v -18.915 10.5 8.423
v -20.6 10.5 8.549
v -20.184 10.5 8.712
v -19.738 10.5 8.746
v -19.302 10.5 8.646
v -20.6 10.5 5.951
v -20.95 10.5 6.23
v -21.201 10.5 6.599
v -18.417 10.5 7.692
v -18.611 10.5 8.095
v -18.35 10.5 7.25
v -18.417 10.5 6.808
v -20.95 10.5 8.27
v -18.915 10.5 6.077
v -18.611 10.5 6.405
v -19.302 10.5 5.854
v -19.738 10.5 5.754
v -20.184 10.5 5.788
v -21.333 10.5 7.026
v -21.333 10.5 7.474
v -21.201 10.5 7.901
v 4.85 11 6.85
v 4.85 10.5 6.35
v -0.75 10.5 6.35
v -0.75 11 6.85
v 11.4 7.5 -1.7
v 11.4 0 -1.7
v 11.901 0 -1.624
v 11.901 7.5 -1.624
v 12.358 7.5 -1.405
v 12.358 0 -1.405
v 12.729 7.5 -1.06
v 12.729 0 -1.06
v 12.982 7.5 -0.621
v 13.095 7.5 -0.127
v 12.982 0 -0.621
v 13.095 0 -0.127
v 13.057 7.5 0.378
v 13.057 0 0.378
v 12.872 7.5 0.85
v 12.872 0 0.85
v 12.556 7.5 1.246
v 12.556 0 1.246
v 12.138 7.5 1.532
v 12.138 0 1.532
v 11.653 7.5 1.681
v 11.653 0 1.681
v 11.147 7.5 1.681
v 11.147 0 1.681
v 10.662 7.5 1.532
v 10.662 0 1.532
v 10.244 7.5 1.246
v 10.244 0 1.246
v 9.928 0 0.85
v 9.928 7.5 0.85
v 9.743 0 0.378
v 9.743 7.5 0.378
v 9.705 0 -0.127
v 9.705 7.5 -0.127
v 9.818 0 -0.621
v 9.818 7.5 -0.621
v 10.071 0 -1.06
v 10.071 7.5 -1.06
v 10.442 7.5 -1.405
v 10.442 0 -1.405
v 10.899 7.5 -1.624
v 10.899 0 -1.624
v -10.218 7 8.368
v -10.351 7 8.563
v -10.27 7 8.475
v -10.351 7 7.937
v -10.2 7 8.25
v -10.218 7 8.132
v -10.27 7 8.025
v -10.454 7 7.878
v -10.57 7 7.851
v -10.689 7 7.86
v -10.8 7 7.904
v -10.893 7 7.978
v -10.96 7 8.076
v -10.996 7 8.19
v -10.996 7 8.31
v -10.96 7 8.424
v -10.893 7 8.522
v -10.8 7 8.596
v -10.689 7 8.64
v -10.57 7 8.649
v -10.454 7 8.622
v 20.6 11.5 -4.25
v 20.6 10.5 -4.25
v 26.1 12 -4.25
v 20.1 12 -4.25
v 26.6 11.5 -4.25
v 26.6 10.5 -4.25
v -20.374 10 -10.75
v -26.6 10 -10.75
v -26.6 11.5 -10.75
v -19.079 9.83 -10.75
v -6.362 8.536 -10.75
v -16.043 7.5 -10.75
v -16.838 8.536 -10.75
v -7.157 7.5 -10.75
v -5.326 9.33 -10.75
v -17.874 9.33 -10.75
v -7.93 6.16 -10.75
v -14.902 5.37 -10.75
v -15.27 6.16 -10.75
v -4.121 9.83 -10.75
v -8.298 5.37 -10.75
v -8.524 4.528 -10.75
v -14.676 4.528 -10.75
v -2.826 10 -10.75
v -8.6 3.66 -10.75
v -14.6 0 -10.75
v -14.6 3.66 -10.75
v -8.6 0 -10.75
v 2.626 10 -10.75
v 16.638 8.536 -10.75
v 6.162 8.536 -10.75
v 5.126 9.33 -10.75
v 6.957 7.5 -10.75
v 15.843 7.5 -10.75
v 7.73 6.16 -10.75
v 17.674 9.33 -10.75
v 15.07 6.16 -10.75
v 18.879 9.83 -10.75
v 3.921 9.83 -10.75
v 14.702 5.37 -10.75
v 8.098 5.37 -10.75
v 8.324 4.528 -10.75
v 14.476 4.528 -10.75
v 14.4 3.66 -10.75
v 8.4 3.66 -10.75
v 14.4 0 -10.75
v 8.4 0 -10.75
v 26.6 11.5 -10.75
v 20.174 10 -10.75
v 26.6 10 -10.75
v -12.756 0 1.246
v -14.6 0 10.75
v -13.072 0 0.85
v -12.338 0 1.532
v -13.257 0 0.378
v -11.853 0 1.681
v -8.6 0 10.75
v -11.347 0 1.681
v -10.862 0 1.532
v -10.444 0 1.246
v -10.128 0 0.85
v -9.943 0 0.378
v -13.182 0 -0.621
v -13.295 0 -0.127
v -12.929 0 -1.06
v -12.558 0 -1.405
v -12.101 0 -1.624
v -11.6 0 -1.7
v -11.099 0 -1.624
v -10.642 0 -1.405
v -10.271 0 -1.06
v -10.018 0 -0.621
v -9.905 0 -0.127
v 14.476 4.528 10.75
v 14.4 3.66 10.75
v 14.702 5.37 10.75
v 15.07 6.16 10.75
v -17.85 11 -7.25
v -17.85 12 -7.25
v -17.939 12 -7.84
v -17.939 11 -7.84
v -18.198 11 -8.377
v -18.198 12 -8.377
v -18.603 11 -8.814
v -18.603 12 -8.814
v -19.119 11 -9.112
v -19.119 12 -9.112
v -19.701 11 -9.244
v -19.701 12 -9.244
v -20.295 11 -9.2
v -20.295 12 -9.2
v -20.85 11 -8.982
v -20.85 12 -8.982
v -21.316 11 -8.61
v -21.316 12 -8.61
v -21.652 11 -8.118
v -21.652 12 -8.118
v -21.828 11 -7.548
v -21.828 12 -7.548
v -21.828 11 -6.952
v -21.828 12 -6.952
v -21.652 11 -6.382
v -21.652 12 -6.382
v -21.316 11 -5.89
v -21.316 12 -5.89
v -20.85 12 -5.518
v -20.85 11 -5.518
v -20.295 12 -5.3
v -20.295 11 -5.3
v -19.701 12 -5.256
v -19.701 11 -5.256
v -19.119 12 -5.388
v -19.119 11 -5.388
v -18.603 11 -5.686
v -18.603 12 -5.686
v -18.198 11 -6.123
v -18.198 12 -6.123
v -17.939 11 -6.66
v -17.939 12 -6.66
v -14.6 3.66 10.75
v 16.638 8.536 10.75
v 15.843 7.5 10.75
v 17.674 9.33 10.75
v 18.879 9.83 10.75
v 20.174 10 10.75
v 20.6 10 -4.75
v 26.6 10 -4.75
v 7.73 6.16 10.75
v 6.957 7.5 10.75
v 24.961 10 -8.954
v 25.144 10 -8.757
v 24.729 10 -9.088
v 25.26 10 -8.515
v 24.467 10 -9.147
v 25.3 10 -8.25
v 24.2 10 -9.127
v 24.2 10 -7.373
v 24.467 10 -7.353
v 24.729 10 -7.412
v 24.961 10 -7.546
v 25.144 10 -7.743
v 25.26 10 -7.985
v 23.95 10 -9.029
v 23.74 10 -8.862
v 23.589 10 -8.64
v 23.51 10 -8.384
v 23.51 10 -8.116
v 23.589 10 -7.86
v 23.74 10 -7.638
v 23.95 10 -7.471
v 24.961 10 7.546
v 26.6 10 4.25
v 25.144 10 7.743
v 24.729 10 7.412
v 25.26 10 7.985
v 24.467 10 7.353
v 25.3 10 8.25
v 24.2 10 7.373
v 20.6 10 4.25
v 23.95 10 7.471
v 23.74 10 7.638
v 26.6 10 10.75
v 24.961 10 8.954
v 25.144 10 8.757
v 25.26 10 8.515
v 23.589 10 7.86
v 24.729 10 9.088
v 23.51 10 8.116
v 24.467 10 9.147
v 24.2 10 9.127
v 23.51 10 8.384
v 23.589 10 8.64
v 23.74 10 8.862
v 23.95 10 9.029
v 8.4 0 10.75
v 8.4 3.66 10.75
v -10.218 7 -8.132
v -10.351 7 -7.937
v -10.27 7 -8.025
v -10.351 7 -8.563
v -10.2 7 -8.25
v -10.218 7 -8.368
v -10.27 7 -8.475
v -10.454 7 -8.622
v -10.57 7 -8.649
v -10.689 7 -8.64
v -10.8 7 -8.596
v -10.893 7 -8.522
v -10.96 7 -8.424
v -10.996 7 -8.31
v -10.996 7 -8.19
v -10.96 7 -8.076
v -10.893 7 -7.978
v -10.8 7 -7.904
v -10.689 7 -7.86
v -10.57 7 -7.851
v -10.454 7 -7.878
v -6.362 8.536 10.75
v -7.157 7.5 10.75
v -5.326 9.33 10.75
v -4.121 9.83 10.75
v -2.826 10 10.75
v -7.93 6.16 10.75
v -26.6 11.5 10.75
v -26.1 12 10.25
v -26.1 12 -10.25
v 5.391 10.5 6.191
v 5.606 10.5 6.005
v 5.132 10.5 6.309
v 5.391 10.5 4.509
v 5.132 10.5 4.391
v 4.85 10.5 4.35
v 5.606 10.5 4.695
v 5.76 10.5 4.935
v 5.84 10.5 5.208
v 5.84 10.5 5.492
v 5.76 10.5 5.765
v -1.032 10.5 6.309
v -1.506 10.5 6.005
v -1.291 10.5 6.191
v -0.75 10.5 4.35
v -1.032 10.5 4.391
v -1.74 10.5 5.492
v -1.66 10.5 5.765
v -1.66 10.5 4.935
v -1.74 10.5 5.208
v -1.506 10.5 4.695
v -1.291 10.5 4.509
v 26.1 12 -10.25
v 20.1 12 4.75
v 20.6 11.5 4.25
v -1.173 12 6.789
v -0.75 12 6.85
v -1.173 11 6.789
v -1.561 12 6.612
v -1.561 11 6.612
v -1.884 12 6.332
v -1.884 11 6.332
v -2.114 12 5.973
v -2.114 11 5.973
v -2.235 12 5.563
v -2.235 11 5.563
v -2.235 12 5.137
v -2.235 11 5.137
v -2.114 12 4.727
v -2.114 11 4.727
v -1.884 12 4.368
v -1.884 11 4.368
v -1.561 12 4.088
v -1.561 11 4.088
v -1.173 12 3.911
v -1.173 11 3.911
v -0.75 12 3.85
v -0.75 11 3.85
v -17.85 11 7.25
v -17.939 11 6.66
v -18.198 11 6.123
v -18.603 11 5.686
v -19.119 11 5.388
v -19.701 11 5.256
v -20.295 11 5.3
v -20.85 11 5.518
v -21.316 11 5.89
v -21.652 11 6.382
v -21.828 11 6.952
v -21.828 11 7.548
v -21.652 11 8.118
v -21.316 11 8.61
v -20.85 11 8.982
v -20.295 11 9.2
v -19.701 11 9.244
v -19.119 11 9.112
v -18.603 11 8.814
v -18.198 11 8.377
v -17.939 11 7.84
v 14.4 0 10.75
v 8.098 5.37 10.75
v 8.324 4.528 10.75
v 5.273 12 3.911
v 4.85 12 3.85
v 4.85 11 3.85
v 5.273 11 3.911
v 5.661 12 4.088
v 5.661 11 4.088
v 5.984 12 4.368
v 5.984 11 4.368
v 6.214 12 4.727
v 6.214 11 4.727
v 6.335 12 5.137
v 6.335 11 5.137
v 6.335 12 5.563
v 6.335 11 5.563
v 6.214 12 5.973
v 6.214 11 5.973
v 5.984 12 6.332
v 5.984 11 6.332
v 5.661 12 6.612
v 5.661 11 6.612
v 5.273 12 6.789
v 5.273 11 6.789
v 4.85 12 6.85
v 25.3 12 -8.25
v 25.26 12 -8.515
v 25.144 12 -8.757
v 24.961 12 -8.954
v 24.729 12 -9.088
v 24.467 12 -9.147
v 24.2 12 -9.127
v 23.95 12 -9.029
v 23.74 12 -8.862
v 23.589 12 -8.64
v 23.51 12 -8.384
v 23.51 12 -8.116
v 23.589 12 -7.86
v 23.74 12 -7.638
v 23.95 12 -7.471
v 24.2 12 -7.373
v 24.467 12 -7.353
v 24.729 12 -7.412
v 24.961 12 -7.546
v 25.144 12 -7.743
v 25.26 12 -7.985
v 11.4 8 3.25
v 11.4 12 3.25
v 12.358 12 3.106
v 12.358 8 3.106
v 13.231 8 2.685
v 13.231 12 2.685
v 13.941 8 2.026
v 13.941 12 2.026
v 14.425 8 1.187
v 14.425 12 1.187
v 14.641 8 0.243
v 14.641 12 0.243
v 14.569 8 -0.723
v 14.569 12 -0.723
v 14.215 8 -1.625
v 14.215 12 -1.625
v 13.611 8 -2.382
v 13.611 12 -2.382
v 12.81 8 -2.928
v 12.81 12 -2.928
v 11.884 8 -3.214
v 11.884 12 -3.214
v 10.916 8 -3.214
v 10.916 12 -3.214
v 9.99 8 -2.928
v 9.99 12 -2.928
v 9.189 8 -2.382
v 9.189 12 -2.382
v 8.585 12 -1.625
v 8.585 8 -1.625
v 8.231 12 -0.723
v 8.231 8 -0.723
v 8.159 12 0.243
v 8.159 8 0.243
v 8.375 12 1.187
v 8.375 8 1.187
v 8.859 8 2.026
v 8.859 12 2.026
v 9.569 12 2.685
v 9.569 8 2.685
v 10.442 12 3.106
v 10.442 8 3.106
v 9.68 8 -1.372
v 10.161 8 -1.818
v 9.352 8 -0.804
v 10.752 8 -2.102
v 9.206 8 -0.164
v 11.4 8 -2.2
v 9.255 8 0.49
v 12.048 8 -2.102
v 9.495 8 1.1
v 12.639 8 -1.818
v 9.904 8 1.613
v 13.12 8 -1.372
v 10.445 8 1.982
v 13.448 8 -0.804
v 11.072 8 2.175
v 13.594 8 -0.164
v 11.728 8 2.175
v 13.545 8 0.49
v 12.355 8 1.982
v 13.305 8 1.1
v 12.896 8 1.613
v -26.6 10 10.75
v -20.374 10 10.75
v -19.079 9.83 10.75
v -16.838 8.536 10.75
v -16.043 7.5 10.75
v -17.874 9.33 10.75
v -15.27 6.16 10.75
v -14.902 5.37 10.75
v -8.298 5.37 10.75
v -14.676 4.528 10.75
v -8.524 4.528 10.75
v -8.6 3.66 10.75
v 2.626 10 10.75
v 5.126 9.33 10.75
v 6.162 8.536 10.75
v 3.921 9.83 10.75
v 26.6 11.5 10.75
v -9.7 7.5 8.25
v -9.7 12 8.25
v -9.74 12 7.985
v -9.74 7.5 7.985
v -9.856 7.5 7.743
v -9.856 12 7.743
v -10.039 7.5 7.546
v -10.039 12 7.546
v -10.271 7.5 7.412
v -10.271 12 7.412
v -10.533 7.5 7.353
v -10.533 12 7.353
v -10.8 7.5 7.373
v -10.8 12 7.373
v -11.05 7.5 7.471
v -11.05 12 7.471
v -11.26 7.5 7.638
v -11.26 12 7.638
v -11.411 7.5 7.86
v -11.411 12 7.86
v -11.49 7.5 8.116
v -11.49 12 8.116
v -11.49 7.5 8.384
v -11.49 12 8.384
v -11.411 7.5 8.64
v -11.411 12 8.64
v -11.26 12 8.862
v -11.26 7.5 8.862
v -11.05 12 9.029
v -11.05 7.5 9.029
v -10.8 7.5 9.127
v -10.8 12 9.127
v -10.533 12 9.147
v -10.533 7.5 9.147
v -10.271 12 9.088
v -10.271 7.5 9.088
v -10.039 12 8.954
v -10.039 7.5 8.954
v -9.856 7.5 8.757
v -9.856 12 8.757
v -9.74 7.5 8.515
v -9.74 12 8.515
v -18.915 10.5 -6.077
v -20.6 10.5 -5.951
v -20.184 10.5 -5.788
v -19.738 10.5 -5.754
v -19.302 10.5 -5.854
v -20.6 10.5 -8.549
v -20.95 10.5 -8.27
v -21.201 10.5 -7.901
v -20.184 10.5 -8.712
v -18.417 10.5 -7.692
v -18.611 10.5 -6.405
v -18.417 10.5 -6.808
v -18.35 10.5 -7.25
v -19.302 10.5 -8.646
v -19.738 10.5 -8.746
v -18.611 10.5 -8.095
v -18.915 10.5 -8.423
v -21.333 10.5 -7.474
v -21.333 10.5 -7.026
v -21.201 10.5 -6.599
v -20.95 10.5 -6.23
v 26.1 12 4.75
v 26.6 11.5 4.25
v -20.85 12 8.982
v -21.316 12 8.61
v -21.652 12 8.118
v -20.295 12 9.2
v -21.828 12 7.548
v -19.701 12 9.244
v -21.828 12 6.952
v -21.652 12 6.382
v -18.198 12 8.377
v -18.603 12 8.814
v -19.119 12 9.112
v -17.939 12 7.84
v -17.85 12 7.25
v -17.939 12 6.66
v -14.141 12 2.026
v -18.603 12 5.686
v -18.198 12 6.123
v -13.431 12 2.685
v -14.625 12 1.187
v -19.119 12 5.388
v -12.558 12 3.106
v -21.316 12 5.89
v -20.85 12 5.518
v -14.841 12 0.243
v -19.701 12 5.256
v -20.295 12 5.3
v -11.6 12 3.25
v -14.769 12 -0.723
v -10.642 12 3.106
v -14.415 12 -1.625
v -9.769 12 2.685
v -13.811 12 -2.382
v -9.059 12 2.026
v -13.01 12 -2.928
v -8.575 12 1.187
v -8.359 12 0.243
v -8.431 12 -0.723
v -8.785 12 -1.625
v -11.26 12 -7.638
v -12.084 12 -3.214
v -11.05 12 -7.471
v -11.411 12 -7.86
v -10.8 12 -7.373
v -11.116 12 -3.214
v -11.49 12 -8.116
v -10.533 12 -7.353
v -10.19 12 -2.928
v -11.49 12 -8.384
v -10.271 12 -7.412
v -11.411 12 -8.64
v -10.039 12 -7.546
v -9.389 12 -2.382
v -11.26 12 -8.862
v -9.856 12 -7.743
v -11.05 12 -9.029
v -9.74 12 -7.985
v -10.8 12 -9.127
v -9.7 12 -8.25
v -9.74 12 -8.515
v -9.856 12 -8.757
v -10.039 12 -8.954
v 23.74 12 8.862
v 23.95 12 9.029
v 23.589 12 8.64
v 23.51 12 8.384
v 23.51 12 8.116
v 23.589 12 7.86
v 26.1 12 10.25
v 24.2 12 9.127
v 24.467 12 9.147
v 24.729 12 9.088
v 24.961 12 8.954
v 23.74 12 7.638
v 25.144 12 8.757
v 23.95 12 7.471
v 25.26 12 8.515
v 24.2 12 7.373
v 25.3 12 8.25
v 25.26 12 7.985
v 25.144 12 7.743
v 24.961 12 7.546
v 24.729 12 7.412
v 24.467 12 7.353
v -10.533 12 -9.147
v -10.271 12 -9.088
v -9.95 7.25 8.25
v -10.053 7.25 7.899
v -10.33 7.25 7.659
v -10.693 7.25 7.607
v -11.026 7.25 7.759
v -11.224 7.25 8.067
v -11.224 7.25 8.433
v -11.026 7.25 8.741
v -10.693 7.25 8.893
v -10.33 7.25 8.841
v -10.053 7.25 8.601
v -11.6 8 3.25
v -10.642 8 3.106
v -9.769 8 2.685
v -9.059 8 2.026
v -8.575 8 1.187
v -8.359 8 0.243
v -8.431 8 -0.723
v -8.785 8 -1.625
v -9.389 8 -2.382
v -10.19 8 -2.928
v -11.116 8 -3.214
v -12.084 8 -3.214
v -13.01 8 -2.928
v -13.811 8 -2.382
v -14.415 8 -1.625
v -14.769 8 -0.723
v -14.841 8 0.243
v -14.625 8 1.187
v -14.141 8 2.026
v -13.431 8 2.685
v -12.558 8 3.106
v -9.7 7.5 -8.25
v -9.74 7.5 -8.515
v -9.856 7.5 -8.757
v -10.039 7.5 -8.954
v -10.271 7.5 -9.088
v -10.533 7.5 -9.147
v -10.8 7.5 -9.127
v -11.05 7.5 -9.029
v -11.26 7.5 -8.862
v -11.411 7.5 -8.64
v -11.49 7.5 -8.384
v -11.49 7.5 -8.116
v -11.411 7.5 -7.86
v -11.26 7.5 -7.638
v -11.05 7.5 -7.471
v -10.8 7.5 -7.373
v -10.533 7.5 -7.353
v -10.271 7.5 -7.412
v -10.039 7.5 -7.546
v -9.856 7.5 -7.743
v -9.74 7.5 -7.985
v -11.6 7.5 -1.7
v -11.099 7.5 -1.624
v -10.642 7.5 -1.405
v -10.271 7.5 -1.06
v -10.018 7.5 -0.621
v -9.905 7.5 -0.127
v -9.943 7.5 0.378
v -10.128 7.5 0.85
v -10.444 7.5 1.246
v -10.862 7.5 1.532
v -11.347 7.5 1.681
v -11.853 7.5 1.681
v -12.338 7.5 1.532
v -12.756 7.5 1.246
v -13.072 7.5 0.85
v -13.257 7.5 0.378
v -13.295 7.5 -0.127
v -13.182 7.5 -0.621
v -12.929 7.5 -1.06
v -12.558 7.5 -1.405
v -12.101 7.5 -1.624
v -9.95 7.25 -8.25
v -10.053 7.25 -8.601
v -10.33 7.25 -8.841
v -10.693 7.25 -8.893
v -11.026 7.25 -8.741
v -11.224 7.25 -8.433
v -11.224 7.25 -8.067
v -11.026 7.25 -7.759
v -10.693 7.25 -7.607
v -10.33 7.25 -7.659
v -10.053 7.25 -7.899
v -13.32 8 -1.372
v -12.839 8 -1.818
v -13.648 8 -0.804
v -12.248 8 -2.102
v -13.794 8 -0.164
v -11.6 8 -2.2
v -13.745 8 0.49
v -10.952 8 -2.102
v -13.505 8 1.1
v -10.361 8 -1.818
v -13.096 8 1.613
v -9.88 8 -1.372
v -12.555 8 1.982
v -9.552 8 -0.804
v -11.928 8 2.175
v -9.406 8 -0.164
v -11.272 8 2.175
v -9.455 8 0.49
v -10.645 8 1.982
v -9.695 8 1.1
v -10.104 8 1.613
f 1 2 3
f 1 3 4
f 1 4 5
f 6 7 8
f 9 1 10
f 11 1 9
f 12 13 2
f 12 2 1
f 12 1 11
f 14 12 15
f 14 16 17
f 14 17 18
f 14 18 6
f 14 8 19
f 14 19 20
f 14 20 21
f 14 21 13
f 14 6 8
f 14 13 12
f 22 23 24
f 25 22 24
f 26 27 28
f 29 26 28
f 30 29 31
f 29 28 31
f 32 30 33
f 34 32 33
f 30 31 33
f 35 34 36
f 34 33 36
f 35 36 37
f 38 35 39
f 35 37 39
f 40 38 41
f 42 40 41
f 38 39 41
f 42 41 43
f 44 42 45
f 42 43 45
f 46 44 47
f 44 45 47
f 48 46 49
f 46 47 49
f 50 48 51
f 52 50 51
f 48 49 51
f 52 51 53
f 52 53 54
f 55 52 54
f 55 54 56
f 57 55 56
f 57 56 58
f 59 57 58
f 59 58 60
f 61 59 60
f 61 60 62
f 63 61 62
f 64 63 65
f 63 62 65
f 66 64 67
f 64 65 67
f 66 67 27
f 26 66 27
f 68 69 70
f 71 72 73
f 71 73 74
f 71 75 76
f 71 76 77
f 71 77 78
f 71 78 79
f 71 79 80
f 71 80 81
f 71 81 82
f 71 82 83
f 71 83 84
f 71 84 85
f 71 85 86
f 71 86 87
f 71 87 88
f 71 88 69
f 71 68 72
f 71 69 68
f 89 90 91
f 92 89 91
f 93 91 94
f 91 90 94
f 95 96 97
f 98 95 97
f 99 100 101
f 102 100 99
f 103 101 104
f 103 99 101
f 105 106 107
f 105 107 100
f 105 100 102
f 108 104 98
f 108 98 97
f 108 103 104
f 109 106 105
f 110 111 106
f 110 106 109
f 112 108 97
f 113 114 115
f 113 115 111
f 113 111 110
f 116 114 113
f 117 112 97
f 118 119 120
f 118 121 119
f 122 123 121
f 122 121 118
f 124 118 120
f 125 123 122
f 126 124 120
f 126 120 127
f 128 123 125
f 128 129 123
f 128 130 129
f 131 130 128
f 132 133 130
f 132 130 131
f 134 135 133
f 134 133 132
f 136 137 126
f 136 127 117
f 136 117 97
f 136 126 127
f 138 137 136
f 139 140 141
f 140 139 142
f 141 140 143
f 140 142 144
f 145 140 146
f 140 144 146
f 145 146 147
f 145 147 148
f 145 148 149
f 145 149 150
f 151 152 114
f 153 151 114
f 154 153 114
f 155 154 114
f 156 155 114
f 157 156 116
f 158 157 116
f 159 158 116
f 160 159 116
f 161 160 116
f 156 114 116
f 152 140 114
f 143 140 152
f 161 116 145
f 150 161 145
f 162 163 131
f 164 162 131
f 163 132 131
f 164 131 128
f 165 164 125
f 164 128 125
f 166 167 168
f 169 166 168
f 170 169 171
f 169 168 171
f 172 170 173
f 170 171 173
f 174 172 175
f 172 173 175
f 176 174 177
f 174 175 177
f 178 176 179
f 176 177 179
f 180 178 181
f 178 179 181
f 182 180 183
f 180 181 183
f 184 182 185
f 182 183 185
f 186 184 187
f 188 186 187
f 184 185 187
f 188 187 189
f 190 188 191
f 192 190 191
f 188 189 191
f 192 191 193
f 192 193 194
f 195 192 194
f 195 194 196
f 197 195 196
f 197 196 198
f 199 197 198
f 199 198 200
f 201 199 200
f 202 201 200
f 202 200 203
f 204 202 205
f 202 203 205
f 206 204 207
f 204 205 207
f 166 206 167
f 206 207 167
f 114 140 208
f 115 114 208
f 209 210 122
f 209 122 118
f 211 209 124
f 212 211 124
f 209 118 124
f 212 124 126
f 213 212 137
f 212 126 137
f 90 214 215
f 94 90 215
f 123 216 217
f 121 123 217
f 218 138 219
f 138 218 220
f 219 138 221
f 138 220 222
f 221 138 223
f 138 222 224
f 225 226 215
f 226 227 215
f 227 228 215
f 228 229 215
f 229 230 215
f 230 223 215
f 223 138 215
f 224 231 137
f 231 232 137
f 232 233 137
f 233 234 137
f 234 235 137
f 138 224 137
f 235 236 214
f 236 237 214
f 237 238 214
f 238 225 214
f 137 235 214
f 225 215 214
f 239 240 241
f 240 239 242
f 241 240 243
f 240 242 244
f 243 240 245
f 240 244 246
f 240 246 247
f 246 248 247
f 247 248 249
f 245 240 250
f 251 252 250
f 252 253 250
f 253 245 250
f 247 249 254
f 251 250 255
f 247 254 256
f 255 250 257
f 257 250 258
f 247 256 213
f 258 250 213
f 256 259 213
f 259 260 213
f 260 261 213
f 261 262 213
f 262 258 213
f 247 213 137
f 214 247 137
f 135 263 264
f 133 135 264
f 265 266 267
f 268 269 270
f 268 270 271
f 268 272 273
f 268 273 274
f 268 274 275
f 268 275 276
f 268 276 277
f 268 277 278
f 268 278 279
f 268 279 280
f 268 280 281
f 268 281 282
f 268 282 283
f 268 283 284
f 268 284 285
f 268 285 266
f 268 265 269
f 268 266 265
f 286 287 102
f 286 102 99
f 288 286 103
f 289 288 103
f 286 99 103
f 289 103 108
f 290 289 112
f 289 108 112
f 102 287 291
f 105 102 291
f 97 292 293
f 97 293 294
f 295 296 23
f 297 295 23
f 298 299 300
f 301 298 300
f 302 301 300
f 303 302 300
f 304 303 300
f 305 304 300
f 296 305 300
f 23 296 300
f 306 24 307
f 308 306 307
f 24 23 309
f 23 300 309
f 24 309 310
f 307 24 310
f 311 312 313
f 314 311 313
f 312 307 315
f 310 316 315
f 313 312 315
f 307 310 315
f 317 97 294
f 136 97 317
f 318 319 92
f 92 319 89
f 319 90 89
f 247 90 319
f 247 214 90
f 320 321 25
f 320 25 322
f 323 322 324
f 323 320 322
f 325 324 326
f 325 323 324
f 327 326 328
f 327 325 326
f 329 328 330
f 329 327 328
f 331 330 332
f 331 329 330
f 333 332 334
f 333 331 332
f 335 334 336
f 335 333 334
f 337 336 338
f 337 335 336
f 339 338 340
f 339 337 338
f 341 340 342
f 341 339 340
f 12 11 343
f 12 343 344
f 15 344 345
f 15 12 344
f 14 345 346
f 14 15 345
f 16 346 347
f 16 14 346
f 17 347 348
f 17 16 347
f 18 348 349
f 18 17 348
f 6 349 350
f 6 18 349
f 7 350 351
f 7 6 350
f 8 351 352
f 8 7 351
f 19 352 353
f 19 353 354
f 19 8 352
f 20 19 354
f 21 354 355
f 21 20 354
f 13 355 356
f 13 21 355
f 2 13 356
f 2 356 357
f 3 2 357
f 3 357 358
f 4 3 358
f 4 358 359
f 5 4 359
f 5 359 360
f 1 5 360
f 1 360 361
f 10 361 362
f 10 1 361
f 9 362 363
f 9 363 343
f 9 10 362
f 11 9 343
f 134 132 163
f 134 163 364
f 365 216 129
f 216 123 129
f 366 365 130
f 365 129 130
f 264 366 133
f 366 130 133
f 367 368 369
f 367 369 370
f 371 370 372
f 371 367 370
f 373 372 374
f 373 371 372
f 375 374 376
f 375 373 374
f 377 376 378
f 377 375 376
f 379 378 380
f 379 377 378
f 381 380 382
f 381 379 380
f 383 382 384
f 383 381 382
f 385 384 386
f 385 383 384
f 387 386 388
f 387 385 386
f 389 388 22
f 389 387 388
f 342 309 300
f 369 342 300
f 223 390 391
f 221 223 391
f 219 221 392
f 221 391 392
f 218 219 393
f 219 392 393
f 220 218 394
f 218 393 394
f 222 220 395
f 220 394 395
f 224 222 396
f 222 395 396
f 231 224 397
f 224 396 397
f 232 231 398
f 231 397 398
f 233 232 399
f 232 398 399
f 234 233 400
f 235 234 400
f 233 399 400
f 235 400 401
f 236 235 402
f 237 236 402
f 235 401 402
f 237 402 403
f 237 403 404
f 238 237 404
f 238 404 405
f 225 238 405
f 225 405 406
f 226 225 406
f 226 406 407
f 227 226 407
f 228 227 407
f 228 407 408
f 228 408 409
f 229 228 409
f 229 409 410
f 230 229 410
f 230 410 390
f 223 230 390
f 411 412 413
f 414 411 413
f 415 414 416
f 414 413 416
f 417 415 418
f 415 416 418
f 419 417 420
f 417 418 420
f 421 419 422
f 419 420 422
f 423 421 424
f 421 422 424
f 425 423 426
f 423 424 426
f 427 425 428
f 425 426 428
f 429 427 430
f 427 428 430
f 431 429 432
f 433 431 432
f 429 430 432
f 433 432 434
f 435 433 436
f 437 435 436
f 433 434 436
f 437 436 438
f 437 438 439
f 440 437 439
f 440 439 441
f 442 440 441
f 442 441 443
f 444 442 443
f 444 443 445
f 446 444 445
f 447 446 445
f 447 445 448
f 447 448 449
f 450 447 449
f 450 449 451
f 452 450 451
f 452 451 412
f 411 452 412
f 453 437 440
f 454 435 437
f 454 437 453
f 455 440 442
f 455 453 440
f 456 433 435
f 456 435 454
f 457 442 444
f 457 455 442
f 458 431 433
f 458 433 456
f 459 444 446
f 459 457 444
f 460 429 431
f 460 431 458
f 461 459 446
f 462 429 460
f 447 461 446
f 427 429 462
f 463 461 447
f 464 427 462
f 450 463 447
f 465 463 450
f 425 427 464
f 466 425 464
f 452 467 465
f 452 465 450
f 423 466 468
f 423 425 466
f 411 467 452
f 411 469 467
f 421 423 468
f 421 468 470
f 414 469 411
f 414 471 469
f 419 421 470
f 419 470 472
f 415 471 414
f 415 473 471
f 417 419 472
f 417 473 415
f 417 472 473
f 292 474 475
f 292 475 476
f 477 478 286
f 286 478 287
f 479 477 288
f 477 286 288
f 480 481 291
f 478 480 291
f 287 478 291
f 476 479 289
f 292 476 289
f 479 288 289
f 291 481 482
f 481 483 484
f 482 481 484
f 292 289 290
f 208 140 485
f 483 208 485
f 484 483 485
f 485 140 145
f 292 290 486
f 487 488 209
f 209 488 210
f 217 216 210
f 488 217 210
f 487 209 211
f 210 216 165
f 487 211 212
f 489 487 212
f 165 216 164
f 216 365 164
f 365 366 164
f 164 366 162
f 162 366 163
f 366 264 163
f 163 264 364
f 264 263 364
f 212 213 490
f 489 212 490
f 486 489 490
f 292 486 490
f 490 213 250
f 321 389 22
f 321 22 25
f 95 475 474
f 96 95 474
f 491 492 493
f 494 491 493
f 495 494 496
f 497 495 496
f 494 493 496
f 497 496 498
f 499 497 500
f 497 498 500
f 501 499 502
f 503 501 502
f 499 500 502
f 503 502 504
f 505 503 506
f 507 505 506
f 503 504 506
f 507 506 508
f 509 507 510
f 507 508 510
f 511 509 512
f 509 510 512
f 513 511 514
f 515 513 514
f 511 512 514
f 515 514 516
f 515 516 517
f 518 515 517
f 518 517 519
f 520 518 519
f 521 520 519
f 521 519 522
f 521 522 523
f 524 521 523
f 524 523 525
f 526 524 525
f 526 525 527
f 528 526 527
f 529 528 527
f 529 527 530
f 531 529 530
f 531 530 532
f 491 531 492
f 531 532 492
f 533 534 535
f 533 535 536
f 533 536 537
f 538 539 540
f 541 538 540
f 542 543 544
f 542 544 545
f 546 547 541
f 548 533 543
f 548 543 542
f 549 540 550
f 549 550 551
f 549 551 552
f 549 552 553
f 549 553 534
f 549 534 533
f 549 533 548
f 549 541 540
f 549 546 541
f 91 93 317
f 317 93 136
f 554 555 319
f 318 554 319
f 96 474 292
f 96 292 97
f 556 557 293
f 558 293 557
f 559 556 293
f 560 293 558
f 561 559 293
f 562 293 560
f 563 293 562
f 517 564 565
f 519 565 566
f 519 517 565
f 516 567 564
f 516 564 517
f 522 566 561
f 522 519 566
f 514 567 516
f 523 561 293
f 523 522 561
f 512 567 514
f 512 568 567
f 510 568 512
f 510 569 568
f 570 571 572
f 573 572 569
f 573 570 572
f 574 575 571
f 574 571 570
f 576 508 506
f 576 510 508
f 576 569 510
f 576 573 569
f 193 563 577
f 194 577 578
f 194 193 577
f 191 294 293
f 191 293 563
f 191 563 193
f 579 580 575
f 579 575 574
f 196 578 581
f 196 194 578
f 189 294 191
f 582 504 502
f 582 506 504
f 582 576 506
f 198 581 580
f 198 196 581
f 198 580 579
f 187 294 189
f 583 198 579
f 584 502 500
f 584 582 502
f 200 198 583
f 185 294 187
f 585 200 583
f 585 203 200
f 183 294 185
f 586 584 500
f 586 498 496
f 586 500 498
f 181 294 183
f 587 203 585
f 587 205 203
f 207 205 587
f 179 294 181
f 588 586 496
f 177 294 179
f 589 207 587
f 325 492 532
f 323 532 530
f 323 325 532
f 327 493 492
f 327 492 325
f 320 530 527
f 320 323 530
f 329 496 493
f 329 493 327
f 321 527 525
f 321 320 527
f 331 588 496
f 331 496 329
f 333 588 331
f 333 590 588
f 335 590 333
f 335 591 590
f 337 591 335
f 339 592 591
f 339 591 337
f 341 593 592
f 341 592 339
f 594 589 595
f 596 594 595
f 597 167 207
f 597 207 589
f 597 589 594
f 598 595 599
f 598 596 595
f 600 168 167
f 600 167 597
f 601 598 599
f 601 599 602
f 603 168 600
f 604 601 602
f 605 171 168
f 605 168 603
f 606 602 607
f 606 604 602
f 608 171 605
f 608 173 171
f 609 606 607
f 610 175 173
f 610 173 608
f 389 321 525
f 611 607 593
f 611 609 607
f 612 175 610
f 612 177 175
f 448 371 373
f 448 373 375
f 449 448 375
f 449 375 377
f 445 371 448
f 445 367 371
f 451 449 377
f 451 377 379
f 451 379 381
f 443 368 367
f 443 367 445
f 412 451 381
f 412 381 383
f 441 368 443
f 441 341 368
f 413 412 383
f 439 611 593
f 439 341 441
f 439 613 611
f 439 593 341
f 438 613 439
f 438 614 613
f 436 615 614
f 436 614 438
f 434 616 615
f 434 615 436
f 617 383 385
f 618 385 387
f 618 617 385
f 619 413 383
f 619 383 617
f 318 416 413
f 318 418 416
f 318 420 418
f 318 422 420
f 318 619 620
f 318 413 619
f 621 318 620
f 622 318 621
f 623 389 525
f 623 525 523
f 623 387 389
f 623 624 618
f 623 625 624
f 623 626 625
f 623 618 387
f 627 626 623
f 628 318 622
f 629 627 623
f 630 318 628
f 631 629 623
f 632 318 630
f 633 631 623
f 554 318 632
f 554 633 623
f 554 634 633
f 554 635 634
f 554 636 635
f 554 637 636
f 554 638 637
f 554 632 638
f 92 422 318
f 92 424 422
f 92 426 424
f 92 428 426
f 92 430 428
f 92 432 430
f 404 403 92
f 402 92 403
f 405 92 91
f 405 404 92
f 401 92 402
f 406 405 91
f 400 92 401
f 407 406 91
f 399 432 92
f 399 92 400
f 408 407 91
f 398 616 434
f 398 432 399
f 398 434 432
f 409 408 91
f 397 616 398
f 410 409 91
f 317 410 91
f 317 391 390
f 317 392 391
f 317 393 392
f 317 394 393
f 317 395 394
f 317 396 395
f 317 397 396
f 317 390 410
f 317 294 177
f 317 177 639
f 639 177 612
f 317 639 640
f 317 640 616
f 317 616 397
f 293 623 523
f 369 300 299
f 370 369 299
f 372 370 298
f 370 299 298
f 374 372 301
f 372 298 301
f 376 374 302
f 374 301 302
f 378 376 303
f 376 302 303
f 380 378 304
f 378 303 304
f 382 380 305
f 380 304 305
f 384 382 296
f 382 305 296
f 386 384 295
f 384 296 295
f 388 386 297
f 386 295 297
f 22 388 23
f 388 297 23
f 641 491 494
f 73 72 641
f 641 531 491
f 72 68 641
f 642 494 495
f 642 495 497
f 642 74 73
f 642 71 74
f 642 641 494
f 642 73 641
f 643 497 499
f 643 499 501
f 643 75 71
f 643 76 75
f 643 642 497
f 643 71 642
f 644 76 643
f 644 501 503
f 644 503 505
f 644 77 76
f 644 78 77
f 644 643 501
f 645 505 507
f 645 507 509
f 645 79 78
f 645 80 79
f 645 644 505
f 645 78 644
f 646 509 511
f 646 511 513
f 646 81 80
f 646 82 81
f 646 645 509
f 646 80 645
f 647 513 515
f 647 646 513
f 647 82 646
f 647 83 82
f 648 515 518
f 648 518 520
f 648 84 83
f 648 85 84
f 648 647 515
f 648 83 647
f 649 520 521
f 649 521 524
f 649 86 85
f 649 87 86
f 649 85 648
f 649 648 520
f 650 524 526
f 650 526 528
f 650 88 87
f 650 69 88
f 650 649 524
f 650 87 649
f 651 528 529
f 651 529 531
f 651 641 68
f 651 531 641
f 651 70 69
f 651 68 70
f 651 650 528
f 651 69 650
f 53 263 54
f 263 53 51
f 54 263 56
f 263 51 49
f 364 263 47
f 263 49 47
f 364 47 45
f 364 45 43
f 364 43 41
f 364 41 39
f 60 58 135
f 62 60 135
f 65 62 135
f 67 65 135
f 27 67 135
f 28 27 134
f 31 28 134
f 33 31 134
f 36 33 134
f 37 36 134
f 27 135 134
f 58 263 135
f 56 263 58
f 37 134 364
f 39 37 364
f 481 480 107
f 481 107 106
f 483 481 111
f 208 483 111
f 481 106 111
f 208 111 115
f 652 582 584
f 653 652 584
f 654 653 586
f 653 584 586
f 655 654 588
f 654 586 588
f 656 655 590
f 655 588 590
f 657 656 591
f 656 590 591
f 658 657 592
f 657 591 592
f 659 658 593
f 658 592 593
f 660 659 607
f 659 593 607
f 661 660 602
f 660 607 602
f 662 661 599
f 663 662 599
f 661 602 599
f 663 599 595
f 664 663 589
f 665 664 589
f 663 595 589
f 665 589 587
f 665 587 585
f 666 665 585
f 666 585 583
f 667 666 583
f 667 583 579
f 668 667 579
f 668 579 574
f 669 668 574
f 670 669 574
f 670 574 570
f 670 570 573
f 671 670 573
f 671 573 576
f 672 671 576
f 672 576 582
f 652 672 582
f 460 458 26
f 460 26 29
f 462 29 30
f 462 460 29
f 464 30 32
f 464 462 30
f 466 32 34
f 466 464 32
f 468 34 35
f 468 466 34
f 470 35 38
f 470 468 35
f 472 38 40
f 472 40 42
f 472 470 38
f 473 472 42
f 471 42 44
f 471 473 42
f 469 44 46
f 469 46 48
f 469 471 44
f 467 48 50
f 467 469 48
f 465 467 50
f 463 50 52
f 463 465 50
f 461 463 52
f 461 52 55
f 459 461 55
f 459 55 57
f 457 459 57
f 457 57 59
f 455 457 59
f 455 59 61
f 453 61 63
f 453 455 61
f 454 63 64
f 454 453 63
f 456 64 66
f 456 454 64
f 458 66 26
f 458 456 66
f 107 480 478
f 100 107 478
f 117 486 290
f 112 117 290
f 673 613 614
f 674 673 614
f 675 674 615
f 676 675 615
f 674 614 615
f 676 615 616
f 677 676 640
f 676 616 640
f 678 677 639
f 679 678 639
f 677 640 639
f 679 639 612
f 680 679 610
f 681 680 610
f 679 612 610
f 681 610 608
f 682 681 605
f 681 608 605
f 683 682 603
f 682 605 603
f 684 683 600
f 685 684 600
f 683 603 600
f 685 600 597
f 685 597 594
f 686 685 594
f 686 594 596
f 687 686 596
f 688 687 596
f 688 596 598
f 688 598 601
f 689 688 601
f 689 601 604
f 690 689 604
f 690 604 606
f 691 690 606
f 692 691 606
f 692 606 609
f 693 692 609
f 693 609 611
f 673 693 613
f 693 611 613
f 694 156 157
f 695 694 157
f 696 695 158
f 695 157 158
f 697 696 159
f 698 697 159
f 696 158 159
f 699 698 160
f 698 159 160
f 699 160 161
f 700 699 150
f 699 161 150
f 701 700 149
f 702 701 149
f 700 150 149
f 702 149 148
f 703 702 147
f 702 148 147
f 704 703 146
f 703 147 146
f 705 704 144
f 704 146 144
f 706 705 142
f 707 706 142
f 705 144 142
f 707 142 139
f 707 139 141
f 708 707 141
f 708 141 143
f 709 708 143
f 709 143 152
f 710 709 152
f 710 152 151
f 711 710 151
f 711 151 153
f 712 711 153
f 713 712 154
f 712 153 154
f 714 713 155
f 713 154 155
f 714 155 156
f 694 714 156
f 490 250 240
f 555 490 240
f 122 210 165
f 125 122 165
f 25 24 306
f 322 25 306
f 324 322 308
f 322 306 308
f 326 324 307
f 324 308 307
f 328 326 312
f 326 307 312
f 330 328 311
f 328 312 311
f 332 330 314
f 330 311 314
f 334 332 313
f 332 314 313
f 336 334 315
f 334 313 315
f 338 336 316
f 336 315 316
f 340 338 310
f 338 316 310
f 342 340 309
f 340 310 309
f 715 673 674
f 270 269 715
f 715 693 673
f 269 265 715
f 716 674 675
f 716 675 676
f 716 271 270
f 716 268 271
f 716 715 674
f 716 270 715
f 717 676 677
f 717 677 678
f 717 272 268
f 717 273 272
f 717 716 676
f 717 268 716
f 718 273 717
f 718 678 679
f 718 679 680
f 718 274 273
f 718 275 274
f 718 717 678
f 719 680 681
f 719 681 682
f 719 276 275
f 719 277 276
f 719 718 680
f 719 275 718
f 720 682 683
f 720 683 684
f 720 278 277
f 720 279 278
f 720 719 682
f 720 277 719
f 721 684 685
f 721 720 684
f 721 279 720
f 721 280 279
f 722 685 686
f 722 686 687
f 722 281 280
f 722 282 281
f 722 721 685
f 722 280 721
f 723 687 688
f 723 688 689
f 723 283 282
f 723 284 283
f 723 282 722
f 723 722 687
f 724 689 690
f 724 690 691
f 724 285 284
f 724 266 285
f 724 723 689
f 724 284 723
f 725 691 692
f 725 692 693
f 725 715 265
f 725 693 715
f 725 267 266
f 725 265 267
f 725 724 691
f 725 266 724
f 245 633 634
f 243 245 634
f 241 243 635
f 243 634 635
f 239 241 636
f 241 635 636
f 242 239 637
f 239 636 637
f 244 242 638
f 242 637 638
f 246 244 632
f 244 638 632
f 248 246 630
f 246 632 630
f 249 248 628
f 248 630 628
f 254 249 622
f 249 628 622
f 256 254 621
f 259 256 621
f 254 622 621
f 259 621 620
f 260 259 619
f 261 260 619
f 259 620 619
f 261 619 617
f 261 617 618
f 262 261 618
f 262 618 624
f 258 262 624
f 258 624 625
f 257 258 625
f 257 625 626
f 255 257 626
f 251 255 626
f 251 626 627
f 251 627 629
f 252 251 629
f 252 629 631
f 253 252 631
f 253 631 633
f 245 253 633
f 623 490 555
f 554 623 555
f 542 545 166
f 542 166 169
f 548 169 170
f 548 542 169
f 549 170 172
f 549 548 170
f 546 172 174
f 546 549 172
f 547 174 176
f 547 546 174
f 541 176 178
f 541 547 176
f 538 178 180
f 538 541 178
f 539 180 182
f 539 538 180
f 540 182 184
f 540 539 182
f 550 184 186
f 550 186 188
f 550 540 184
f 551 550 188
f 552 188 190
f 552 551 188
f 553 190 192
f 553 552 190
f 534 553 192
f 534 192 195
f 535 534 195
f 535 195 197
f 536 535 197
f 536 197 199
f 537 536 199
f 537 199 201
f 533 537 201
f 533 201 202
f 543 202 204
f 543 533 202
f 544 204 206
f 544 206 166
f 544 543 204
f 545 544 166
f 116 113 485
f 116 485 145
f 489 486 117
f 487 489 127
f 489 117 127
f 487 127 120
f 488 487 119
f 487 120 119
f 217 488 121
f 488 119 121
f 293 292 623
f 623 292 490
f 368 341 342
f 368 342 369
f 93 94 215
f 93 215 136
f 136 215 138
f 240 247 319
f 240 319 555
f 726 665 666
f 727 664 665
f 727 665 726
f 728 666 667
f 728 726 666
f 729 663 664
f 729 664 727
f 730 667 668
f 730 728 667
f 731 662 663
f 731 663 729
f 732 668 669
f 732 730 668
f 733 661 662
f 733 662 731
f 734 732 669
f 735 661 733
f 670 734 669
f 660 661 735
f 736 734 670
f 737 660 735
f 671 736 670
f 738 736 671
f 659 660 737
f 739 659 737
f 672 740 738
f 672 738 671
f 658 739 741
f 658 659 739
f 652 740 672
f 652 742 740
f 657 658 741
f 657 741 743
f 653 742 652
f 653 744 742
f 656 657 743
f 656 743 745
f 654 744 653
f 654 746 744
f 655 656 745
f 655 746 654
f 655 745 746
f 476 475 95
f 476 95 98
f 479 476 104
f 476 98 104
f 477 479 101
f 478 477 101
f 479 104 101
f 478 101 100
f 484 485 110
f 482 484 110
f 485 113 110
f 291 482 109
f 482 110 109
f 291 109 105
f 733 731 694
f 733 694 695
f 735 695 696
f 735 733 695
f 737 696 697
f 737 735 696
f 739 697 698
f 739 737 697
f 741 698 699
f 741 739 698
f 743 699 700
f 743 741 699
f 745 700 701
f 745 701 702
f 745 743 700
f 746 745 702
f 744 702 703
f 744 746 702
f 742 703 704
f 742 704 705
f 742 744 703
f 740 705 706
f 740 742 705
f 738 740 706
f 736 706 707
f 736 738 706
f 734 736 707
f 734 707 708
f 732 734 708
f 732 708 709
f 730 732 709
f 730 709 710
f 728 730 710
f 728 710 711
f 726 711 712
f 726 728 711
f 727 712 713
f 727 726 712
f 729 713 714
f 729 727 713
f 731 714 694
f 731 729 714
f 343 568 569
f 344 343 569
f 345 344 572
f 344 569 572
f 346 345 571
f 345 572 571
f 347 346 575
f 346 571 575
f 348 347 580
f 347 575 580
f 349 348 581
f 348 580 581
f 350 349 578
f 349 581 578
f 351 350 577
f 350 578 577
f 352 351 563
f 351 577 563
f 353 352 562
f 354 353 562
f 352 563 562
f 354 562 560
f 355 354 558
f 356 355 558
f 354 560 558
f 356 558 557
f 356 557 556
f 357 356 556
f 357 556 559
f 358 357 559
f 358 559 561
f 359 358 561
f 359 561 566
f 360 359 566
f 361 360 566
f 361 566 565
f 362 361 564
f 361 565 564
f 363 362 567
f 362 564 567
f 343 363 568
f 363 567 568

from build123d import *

# Parameters (mm, degrees)
SKETCH1_W                                   = 53.2
SKETCH1_H                                   = 21.5
BOSS_EXTRUDE1_DEPTH                         = 12
SKETCH2_R                                   = 0.9
CUT_EXTRUDE1_DEPTH                          = 5
SKETCH3_W                                   = 6
SKETCH3_H                                   = 8.5
CUT_EXTRUDE2_DEPTH                          = 13
SKETCH5_R                                   = 2
CUT_EXTRUDE3_DEPTH                          = 1.5
CBORE_FOR_M3_CHEESE_HEAD_SCREW1_D           = 3.4
CBORE_FOR_M3_CHEESE_HEAD_SCREW1_CBORE_D     = 6.5
CBORE_FOR_M3_CHEESE_HEAD_SCREW1_CBORE_DEPTH = 4
CUT_EXTRUDE4_DEPTH                          = 22.5
FILLET1_R                                   = 5
CHAMFER2_SIZE                               = 0.5
CHAMFER3_SIZE                               = 0.5


with BuildPart() as part:
    # Sketch1 → Boss-Extrude1 (new body)
    with BuildSketch(Plane(origin=(0, 0, 0), x_dir=(1, 0, 0), z_dir=(0, 1, 0))):
        Rectangle(SKETCH1_W, SKETCH1_H)
    extrude(amount=BOSS_EXTRUDE1_DEPTH)

    # Sketch2 → Cut-Extrude1 (cut)
    with BuildSketch(Plane(origin=(0, 12, 0), x_dir=(1, 0, 0), z_dir=(0, 1, 0))):
        with Locations((24.4, 8.25)):
            Circle(SKETCH2_R)
        with Locations((24.4, -8.25)):
            Circle(SKETCH2_R)
        with Locations((-10.6, -8.25)):
            Circle(SKETCH2_R)
        with Locations((-10.6, 8.25)):
            Circle(SKETCH2_R)
    extrude(amount=-CUT_EXTRUDE1_DEPTH, mode=Mode.SUBTRACT)

    # Sketch3 → Cut-Extrude2 (cut, through all)
    with BuildSketch(Plane.XZ):
        with Locations((23.6, 0)):
            Rectangle(SKETCH3_W, SKETCH3_H)
    extrude(amount=-CUT_EXTRUDE2_DEPTH, mode=Mode.SUBTRACT)

    # Sketch5 → Cut-Extrude3 (cut)
    with BuildSketch(Plane(origin=(0, 12, 0), x_dir=(1, 0, 0), z_dir=(0, 1, 0))):
        with Locations((-19.85, 7.25)):
            Circle(SKETCH5_R)
        with Locations((-19.85, -7.25)):
            Circle(SKETCH5_R)
        with BuildLine():
            Line((-0.75, -3.85), (4.85, -3.85))
            ThreePointArc((4.85, -3.85), (6.35, -5.35), (4.85, -6.85))
            Line((4.85, -6.85), (-0.75, -6.85))
            ThreePointArc((-0.75, -6.85), (-2.25, -5.35), (-0.75, -3.85))
        make_face()
    extrude(amount=-CUT_EXTRUDE3_DEPTH, mode=Mode.SUBTRACT)

    # CBORE for M3 Cheese Head Screw1 (through all)
    with Locations(Plane(origin=(-11.6, 12, 0), x_dir=(0, 0, 1), z_dir=(0, 1, 0))):
        with Locations((0, 0), (0, 23)):
            CounterBoreHole(CBORE_FOR_M3_CHEESE_HEAD_SCREW1_D / 2, CBORE_FOR_M3_CHEESE_HEAD_SCREW1_CBORE_D / 2, CBORE_FOR_M3_CHEESE_HEAD_SCREW1_CBORE_DEPTH)

    # Sketch9 → Cut-Extrude4 (cut, through all)
    with BuildSketch(Plane.XY.offset(10.75)):
        Polygon((-17.486751346, 10), (-26.6, 10), (-26.6, 0), (-14.6, 0), (-14.6, 5), align=None)
        Polygon((5.513248654, 10), (-5.713248654, 10), (-8.6, 5), (-8.6, 0), (8.4, 0), (8.4, 5), align=None)
        Polygon((26.6, 0), (26.6, 10), (17.286751346, 10), (14.4, 5), (14.4, 0), align=None)
    extrude(amount=-CUT_EXTRUDE4_DEPTH, mode=Mode.SUBTRACT)

    # Fillet1
    fillet1_edges = [part.edges().sort_by_distance(p)[0] for p in [
        (-14.6, 5, 0),
        (-17.486751346, 10, 0),
        (8.4, 5, 0),
        (-8.6, 5, 0),
        (-5.713248654, 10, 0),
        (5.513248654, 10, 0),
        (17.286751346, 10, 0),
        (14.4, 5, 0),
    ]]
    fillet(fillet1_edges, radius=FILLET1_R)

    # Chamfer2
    chamfer2_edges = [part.edges().sort_by_distance(p)[0] for p in [
        (-11.5, 7, -8.25),
        (-11.5, 7, 8.25),
        (-2.25, 10.5, 5.35),
        (2.05, 10.5, 3.85),
        (6.35, 10.5, 5.35),
        (2.05, 10.5, 6.85),
        (-21.85, 10.5, 7.25),
        (-21.85, 10.5, -7.25),
        (11.4, 8, 1.7),
        (-11.6, 8, 1.7),
    ]]
    chamfer(chamfer2_edges, length=CHAMFER2_SIZE)

    # Chamfer3
    chamfer3_edges = [part.edges().sort_by_distance(p)[0] for p in [
        (-26.6, 12, 0),
        (23.6, 10, -4.25),
        (0, 12, 10.75),
        (26.6, 12, -7.5),
        (20.6, 12, 0),
        (23.6, 12, 4.25),
        (26.6, 12, 7.5),
        (0, 12, -10.75),
    ]]
    chamfer(chamfer3_edges, length=CHAMFER3_SIZE)


solid = part.part
